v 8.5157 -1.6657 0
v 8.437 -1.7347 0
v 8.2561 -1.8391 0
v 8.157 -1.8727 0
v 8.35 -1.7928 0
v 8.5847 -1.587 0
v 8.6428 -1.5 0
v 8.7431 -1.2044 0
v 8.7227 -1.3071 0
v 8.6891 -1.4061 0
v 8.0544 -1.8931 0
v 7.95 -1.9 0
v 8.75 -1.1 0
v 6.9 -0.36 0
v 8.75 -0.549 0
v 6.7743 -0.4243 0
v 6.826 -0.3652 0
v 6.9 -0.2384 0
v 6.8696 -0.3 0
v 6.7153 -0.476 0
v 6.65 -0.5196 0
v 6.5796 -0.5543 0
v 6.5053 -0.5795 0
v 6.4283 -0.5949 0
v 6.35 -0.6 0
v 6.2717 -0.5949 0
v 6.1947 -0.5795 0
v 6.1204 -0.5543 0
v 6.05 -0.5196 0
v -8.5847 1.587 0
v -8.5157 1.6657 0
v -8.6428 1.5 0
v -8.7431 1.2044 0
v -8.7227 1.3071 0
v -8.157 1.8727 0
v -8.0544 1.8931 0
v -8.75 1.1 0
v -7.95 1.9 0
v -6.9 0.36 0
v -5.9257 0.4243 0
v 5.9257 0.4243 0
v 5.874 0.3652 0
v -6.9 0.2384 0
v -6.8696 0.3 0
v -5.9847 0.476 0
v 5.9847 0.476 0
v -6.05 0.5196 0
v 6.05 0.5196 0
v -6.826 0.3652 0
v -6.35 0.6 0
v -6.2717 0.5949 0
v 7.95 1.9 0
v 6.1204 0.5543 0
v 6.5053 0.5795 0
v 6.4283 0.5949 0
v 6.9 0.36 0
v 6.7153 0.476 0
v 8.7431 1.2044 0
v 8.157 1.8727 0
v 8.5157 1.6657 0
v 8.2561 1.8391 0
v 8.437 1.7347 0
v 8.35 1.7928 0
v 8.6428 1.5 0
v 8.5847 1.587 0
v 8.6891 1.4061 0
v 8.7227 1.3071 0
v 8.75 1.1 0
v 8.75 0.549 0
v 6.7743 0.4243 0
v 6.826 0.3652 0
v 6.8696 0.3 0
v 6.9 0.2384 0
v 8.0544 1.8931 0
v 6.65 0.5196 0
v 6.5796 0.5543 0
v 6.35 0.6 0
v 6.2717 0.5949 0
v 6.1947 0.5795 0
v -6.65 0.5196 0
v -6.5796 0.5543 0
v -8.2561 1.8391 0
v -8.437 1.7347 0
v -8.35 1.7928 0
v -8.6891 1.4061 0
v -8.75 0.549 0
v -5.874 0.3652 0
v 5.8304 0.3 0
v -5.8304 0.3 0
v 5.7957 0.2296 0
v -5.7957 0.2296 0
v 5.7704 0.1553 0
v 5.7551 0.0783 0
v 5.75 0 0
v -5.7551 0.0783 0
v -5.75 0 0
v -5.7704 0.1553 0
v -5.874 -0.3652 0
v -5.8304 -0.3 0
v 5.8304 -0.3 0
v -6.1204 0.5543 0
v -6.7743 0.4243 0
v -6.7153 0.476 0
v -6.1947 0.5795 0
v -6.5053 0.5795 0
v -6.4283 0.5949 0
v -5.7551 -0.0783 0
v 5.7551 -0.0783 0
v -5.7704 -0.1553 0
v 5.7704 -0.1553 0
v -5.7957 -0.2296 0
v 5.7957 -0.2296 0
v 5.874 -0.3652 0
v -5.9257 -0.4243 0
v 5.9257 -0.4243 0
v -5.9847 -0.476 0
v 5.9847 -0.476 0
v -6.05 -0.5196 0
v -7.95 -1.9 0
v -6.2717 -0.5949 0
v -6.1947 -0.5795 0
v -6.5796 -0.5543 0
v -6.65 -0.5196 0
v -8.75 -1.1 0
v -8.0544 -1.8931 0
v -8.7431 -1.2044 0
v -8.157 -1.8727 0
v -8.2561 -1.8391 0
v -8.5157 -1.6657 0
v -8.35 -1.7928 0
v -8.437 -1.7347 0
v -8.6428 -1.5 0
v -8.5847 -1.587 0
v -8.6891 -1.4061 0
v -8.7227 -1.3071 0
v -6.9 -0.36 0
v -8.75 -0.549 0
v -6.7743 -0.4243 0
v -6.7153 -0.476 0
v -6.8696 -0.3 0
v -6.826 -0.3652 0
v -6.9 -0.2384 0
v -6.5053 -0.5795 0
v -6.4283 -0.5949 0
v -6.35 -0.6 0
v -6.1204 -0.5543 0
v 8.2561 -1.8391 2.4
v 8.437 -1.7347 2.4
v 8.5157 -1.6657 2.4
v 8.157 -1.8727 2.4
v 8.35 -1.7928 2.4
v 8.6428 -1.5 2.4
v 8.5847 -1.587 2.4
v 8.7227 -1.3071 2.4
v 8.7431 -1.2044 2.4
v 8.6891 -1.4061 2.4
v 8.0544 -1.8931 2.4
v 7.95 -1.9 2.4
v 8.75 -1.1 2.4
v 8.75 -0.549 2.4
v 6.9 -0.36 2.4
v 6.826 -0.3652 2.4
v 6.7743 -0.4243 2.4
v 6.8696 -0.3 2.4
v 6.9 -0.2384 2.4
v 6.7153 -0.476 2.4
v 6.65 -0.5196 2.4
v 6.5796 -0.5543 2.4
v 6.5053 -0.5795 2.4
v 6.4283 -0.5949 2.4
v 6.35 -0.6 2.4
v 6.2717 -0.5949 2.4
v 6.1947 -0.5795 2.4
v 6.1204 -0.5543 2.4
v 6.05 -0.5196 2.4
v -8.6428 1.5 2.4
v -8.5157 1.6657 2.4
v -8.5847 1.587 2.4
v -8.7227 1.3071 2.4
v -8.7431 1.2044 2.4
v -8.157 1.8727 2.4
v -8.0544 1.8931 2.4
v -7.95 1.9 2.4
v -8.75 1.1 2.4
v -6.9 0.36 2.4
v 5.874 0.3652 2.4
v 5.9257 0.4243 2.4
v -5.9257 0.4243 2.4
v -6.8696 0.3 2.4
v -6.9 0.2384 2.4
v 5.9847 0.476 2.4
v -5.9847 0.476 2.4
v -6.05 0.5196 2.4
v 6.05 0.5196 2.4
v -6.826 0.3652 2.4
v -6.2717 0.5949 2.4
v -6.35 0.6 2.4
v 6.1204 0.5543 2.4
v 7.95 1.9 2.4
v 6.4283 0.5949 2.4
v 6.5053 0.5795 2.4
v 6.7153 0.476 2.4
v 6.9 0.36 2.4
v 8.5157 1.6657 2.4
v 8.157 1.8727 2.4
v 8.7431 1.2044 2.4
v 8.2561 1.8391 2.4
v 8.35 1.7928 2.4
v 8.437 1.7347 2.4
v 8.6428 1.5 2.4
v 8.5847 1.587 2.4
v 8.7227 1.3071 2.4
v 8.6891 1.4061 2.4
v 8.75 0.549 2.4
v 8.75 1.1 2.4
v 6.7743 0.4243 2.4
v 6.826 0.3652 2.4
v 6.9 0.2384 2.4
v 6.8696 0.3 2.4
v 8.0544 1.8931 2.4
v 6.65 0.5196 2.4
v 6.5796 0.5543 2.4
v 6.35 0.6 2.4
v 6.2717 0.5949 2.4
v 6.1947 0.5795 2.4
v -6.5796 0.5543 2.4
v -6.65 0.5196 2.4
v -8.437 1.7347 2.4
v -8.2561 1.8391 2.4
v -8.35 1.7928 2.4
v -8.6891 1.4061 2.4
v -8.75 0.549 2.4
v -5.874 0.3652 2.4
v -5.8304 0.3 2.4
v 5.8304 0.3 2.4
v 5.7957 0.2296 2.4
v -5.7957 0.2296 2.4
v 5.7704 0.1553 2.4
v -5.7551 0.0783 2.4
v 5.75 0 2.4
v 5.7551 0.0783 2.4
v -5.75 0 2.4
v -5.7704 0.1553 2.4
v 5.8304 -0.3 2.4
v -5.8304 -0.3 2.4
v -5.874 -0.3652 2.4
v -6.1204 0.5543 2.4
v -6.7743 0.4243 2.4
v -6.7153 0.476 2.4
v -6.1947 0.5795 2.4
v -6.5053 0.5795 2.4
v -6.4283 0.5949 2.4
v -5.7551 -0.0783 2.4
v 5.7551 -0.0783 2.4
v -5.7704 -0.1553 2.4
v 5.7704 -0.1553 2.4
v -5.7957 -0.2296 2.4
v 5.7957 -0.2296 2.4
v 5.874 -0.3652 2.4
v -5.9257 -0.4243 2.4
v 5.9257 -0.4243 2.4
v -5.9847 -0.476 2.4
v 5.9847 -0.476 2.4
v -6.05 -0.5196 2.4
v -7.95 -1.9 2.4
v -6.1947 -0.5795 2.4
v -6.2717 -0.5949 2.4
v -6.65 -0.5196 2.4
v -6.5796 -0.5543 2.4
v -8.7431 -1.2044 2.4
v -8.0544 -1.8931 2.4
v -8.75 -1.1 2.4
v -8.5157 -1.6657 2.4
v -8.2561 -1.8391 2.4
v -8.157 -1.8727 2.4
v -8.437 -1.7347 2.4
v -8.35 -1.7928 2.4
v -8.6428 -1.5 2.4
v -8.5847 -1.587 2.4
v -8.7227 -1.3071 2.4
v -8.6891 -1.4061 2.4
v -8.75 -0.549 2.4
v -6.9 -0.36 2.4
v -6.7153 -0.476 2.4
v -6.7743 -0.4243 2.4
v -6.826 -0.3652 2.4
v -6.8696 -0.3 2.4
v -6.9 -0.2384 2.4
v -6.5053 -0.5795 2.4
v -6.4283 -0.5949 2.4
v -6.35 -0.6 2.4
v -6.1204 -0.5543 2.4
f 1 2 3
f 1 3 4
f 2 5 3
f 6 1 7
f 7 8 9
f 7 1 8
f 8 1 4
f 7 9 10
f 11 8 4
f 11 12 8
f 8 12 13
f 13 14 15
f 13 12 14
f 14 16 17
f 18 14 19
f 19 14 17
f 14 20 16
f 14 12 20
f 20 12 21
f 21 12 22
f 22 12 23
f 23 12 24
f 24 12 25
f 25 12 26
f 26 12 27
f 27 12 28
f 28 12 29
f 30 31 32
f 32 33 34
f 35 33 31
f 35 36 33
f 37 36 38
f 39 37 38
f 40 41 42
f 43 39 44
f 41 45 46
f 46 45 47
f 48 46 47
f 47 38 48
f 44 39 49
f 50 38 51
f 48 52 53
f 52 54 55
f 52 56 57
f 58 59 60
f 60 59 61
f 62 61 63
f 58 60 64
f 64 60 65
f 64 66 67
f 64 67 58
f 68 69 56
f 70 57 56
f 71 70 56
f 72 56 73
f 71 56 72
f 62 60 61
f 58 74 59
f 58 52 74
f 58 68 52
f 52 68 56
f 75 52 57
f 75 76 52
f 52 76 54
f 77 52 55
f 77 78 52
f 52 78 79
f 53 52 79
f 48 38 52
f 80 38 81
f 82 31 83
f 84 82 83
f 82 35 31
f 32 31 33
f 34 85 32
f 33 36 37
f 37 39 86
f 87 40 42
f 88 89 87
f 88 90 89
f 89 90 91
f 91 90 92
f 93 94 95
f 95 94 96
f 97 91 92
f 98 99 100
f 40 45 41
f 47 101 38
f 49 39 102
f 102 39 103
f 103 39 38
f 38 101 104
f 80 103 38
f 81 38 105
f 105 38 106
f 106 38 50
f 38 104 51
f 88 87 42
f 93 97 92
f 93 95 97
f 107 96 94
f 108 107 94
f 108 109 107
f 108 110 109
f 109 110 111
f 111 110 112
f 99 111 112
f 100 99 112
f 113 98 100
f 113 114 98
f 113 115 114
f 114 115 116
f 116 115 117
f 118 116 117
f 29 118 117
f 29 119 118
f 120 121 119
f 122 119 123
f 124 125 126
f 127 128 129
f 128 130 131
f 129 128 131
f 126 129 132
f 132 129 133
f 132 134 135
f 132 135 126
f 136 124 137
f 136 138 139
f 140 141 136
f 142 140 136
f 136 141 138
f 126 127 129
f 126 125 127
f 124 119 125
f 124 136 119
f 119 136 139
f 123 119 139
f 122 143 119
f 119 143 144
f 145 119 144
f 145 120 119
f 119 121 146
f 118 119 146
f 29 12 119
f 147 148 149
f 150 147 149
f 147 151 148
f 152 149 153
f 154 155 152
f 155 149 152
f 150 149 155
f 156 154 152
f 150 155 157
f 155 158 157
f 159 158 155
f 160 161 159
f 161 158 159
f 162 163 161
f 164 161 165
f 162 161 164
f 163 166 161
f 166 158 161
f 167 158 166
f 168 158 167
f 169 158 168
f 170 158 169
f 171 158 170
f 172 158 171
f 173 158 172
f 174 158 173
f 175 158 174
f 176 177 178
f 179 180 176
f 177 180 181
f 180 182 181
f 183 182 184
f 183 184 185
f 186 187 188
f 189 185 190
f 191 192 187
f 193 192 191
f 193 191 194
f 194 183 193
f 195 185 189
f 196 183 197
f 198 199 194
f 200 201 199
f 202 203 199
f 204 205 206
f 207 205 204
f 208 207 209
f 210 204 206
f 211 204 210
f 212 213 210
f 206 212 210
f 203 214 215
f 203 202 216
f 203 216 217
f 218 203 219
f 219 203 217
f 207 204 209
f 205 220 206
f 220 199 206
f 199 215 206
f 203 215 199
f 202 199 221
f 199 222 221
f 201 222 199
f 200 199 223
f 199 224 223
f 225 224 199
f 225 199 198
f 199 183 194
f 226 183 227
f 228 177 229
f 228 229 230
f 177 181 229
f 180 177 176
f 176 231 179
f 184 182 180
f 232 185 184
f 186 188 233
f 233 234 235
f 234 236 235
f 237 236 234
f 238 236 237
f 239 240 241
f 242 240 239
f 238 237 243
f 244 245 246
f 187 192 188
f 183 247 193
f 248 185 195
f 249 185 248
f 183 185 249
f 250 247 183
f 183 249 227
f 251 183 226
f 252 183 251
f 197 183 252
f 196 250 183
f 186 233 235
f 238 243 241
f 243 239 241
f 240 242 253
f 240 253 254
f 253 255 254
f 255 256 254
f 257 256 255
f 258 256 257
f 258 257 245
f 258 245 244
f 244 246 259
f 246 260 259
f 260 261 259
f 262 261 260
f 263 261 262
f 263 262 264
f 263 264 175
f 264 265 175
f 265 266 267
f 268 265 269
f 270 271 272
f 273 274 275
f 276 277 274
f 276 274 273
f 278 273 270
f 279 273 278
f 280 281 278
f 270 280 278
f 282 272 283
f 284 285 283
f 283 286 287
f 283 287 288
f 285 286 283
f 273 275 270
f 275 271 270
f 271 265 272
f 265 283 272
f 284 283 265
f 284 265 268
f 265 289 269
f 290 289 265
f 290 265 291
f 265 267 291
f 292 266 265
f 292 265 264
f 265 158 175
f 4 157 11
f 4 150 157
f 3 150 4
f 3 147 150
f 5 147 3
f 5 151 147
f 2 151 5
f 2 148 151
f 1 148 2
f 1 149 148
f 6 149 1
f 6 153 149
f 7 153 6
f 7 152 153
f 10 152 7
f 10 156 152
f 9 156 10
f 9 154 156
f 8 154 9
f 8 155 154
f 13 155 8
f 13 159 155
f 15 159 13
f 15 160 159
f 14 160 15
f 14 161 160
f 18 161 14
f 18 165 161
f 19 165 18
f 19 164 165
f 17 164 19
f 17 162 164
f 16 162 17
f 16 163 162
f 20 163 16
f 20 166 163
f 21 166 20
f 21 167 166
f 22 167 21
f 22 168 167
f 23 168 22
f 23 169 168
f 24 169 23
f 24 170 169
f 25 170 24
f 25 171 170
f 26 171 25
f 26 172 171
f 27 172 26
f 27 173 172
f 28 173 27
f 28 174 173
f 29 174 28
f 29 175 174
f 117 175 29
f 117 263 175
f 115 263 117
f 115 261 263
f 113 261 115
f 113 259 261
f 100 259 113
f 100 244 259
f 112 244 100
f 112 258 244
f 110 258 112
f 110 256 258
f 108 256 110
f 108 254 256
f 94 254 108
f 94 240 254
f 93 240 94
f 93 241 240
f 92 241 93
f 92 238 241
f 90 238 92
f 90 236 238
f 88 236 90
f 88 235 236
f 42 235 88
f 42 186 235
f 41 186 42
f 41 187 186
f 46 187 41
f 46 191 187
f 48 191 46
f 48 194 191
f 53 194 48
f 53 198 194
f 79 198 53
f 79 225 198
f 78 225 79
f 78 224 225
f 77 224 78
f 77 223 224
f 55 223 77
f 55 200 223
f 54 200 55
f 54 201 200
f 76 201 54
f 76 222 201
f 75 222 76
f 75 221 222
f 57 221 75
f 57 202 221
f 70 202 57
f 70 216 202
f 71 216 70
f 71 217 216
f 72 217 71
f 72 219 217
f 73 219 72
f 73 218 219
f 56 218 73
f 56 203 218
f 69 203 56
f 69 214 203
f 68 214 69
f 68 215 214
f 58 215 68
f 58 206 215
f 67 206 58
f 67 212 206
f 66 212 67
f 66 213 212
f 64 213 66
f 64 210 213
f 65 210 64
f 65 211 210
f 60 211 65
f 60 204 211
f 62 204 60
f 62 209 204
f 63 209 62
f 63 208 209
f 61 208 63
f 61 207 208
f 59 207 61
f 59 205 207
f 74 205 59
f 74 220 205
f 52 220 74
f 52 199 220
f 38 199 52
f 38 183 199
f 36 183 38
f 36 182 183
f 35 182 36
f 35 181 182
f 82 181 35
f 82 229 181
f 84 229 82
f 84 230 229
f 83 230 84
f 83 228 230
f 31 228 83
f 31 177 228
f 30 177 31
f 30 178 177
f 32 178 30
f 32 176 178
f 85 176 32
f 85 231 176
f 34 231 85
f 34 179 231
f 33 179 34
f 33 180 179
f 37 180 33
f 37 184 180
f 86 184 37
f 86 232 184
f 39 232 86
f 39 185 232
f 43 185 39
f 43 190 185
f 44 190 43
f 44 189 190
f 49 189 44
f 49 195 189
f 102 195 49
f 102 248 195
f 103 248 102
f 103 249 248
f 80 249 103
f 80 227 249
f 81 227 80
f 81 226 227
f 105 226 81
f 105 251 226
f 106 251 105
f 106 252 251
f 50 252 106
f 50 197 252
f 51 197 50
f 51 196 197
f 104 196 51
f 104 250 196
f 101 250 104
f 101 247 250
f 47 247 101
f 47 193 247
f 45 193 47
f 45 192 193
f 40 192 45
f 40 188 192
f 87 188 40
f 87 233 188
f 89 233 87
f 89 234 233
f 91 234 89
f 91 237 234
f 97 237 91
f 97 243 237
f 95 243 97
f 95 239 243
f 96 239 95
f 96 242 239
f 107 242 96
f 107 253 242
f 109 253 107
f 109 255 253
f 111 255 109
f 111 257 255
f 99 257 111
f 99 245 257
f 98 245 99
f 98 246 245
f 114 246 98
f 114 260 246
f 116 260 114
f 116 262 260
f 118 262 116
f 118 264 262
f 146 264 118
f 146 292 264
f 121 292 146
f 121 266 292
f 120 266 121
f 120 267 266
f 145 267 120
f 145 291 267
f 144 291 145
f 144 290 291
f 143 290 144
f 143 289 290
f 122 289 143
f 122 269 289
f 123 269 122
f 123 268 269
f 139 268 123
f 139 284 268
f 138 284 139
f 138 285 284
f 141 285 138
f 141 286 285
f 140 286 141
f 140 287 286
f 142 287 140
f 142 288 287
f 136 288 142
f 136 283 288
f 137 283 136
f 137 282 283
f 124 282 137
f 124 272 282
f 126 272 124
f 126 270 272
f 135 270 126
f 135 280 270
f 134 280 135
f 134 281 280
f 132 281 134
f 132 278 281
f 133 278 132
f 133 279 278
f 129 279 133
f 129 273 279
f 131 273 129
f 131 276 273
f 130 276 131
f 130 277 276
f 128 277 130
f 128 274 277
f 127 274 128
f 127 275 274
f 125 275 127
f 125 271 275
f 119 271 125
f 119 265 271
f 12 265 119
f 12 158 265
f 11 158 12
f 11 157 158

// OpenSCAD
/*
  Copyright (c) 2026 Robert Jackson (N1RWJ).
  License: CC BY-NC-SA 4.0 (Attribution-NonCommercial-ShareAlike).
  https://creativecommons.org/licenses/by-nc-sa/4.0/

  models/ham_radio/lightweight_balanced_feedline/balanced_feedline_spacer.scad

  Lightweight snap-on spacer for a two-wire balanced HF feedline.
  Defaults target DXE-SANTW-500 26 AWG Poly-STEALTH wire and 12.7 mm
  (0.5 inch) conductor center spacing.

  Print flat. In service, each wire runs through one C-shaped channel,
  perpendicular to the face of the spacer.
*/

$fn = 48;
eps = 0.02;

// ---------------------------------------------------------------
// Output
// ---------------------------------------------------------------
// "spacer"           - one spacer using the normal parameters
// "channel_fit_test" - five hole-marked spacers varying channel diameter
// "slot_fit_test"    - five slot-marked spacers varying snap-throat width
render_mode = "spacer";

// ---------------------------------------------------------------
// Wire fit and electrical geometry
// ---------------------------------------------------------------
wire_od             = 1.02;  // nominal jacket OD; measure your own spool
wire_spacing        = 12.7;  // conductor center-to-center spacing
channel_clearance   = 0.18;  // diametral clearance added to wire OD
entry_slot_width    = 0.72;  // narrowest part of the snap-in opening
entry_mouth_width   = 1.10;  // lead-in opening at the outside edge

// ---------------------------------------------------------------
// Spacer body
// ---------------------------------------------------------------
body_height         = 3.8;
body_thickness      = 2.4;
end_margin          = 1.8;   // channel edge to outside edge
corner_radius       = 0.8;
cutout_overlap       = 0.04;  // keeps each slot joined cleanly to its channel
minimum_channel_wall = 1.0;

// ---------------------------------------------------------------
// Fit-test layouts
// ---------------------------------------------------------------
// Samples render left-to-right in the listed order. One through five round
// holes identify channel samples; rectangular slots identify throat samples.
fit_test_clearances = [0.08, 0.13, 0.18, 0.23, 0.28];
fit_test_slot_widths = [0.62, 0.67, 0.72, 0.77, 0.82];
fit_test_gap = 4.0;
fit_test_marker_spacing = 1.6;
fit_test_round_marker_d = 1.0;
fit_test_slot_marker_size = [0.9, 1.6];
fit_test_marker_clearance = 1.2;

function channel_d(clearance) = wire_od + clearance;
function body_width(clearance) =
    wire_spacing + channel_d(clearance) + 2 * end_margin;

// Width of the circular channel at a distance `inset` from its tangent.
// The overlap chord must be narrower than the requested throat so the
// `entry_slot_width` parameter remains the actual minimum opening.
function channel_chord(diameter, inset) =
    2 * sqrt(
        max(
            0,
            pow(diameter / 2, 2)
                - pow(diameter / 2 - inset, 2)
        )
    );

module rounded_rectangle_2d(width, height, radius) {
    assert(width >= 2 * radius,
           "rounded rectangle width must be at least twice the radius");
    assert(height >= 2 * radius,
           "rounded rectangle height must be at least twice the radius");

    hull() {
        for (x = [-width / 2 + radius, width / 2 - radius])
            for (y = [-height / 2 + radius, height / 2 - radius])
                translate([x, y])
                    circle(r = radius);
    }
}

// One C-shaped channel cutout. `side` is -1 for the left wire and
// +1 for the right wire, so both snap openings face outward.
module wire_channel_cutout_2d(
    x_center,
    side,
    clearance,
    width,
    slot_width,
    mouth_width
) {
    diameter = channel_d(clearance);
    neck_x = x_center
        + side * (diameter / 2 - cutout_overlap);

    assert(cutout_overlap > 0,
           "cutout_overlap must be positive");
    assert(cutout_overlap + eps / 2 < diameter / 2,
           "cutout_overlap must be smaller than the channel radius");
    assert(
        channel_chord(diameter, cutout_overlap + eps / 2) < slot_width,
        "cutout_overlap is too large to preserve entry_slot_width"
    );

    translate([x_center, 0])
        circle(d = diameter);

    // The small overlap avoids point-contact geometry at the circle tangent.
    // A full-wire-width mouth provides an easy lead-in while the narrower
    // throat supplies retention.
    hull() {
        translate([neck_x, 0])
            square([eps, slot_width], center = true);

        translate([side * (width / 2 + eps), 0])
            square([eps, mouth_width], center = true);
    }
}

module spacer_2d(
    clearance = channel_clearance,
    slot_width = entry_slot_width,
    mouth_width = entry_mouth_width
) {
    diameter = channel_d(clearance);
    width = body_width(clearance);
    channel_wall = (body_height - diameter) / 2;

    assert(wire_od > 0, "wire_od must be positive");
    assert(wire_spacing > diameter,
           "wire_spacing must exceed the channel diameter");
    assert(clearance >= 0, "channel_clearance cannot be negative");
    assert(slot_width > 0, "entry_slot_width must be positive");
    assert(slot_width < wire_od,
           "entry_slot_width must be smaller than wire_od for retention");
    assert(mouth_width >= wire_od,
           "entry_mouth_width must accept the nominal wire diameter");
    assert(mouth_width < body_height - 2 * corner_radius,
           "entry_mouth_width must fit between the rounded corners");
    assert(channel_wall >= minimum_channel_wall,
           "insufficient wall above/below the wire channel");
    assert(end_margin >= 1.2,
           "end_margin is too short for durable snap jaws");
    assert(corner_radius > 0, "corner_radius must be positive");

    difference() {
        rounded_rectangle_2d(width, body_height, corner_radius);

        wire_channel_cutout_2d(
            -wire_spacing / 2,
            -1,
            clearance,
            width,
            slot_width,
            mouth_width
        );

        wire_channel_cutout_2d(
            wire_spacing / 2,
            1,
            clearance,
            width,
            slot_width,
            mouth_width
        );
    }
}

module fit_test_markers(count, style, clearance) {
    diameter = channel_d(clearance);
    marker_width = style == "round"
        ? fit_test_round_marker_d
        : fit_test_slot_marker_size[0];
    marker_height = style == "round"
        ? fit_test_round_marker_d
        : fit_test_slot_marker_size[1];
    marker_span = (count - 1) * fit_test_marker_spacing + marker_width;
    channel_gap = wire_spacing - diameter;

    assert(count >= 1 && count <= 5,
           "fit-test marker count must be from one through five");
    assert(style == "round" || style == "slot",
           "fit-test marker style must be round or slot");
    assert(fit_test_marker_spacing > marker_width,
           "fit-test markers must not overlap");
    assert((body_height - marker_height) / 2 >= minimum_channel_wall,
           "insufficient wall above/below fit-test markers");
    assert((channel_gap - marker_span) / 2
           >= fit_test_marker_clearance,
           "fit-test markers are too close to the wire channels");

    for (i = [0 : count - 1]) {
        marker_x = (i - (count - 1) / 2) * fit_test_marker_spacing;

        if (style == "round")
            translate([marker_x, 0, -eps])
                cylinder(
                    d = fit_test_round_marker_d,
                    h = body_thickness + 2 * eps
                );
        else
            translate([marker_x, 0, body_thickness / 2])
                cube(
                    [
                        fit_test_slot_marker_size[0],
                        fit_test_slot_marker_size[1],
                        body_thickness + 2 * eps
                    ],
                    center = true
                );
    }
}

module balanced_feedline_spacer(
    clearance = channel_clearance,
    slot_width = entry_slot_width,
    mouth_width = entry_mouth_width,
    marker_count = 0,
    marker_style = "round"
) {
    assert(body_thickness > 0, "body_thickness must be positive");

    difference() {
        linear_extrude(height = body_thickness)
            spacer_2d(clearance, slot_width, mouth_width);

        if (marker_count > 0)
            fit_test_markers(marker_count, marker_style, clearance);
    }
}

module channel_fit_test() {
    count = len(fit_test_clearances);
    max_width = body_width(max(fit_test_clearances));
    pitch = max_width + fit_test_gap;

    assert(count > 0, "fit_test_clearances cannot be empty");

    for (i = [0 : count - 1]) {
        clearance = fit_test_clearances[i];
        diameter = channel_d(clearance);

        echo(
            str(
                "channel sample ", i + 1,
                ": channel_clearance=", clearance,
                " mm, channel_d=", diameter, " mm"
            )
        );

        translate([(i - (count - 1) / 2) * pitch, 0, 0])
            balanced_feedline_spacer(
                clearance = clearance,
                marker_count = i + 1,
                marker_style = "round"
            );
    }
}

module slot_fit_test() {
    count = len(fit_test_slot_widths);
    pitch = body_width(channel_clearance) + fit_test_gap;

    assert(count > 0, "fit_test_slot_widths cannot be empty");

    for (i = [0 : count - 1]) {
        slot_width = fit_test_slot_widths[i];

        echo(
            str(
                "slot sample ", i + 1,
                ": entry_slot_width=", slot_width,
                " mm, channel_d=", channel_d(channel_clearance), " mm"
            )
        );

        translate([(i - (count - 1) / 2) * pitch, 0, 0])
            balanced_feedline_spacer(
                slot_width = slot_width,
                marker_count = i + 1,
                marker_style = "slot"
            );
    }
}

assert(
    render_mode == "spacer"
        || render_mode == "channel_fit_test"
        || render_mode == "slot_fit_test",
    str(
        "render_mode must be \"spacer\", \"channel_fit_test\", ",
        "or \"slot_fit_test\""
    )
);

if (render_mode == "spacer")
    balanced_feedline_spacer();
else if (render_mode == "channel_fit_test")
    channel_fit_test();
else
    slot_fit_test();
